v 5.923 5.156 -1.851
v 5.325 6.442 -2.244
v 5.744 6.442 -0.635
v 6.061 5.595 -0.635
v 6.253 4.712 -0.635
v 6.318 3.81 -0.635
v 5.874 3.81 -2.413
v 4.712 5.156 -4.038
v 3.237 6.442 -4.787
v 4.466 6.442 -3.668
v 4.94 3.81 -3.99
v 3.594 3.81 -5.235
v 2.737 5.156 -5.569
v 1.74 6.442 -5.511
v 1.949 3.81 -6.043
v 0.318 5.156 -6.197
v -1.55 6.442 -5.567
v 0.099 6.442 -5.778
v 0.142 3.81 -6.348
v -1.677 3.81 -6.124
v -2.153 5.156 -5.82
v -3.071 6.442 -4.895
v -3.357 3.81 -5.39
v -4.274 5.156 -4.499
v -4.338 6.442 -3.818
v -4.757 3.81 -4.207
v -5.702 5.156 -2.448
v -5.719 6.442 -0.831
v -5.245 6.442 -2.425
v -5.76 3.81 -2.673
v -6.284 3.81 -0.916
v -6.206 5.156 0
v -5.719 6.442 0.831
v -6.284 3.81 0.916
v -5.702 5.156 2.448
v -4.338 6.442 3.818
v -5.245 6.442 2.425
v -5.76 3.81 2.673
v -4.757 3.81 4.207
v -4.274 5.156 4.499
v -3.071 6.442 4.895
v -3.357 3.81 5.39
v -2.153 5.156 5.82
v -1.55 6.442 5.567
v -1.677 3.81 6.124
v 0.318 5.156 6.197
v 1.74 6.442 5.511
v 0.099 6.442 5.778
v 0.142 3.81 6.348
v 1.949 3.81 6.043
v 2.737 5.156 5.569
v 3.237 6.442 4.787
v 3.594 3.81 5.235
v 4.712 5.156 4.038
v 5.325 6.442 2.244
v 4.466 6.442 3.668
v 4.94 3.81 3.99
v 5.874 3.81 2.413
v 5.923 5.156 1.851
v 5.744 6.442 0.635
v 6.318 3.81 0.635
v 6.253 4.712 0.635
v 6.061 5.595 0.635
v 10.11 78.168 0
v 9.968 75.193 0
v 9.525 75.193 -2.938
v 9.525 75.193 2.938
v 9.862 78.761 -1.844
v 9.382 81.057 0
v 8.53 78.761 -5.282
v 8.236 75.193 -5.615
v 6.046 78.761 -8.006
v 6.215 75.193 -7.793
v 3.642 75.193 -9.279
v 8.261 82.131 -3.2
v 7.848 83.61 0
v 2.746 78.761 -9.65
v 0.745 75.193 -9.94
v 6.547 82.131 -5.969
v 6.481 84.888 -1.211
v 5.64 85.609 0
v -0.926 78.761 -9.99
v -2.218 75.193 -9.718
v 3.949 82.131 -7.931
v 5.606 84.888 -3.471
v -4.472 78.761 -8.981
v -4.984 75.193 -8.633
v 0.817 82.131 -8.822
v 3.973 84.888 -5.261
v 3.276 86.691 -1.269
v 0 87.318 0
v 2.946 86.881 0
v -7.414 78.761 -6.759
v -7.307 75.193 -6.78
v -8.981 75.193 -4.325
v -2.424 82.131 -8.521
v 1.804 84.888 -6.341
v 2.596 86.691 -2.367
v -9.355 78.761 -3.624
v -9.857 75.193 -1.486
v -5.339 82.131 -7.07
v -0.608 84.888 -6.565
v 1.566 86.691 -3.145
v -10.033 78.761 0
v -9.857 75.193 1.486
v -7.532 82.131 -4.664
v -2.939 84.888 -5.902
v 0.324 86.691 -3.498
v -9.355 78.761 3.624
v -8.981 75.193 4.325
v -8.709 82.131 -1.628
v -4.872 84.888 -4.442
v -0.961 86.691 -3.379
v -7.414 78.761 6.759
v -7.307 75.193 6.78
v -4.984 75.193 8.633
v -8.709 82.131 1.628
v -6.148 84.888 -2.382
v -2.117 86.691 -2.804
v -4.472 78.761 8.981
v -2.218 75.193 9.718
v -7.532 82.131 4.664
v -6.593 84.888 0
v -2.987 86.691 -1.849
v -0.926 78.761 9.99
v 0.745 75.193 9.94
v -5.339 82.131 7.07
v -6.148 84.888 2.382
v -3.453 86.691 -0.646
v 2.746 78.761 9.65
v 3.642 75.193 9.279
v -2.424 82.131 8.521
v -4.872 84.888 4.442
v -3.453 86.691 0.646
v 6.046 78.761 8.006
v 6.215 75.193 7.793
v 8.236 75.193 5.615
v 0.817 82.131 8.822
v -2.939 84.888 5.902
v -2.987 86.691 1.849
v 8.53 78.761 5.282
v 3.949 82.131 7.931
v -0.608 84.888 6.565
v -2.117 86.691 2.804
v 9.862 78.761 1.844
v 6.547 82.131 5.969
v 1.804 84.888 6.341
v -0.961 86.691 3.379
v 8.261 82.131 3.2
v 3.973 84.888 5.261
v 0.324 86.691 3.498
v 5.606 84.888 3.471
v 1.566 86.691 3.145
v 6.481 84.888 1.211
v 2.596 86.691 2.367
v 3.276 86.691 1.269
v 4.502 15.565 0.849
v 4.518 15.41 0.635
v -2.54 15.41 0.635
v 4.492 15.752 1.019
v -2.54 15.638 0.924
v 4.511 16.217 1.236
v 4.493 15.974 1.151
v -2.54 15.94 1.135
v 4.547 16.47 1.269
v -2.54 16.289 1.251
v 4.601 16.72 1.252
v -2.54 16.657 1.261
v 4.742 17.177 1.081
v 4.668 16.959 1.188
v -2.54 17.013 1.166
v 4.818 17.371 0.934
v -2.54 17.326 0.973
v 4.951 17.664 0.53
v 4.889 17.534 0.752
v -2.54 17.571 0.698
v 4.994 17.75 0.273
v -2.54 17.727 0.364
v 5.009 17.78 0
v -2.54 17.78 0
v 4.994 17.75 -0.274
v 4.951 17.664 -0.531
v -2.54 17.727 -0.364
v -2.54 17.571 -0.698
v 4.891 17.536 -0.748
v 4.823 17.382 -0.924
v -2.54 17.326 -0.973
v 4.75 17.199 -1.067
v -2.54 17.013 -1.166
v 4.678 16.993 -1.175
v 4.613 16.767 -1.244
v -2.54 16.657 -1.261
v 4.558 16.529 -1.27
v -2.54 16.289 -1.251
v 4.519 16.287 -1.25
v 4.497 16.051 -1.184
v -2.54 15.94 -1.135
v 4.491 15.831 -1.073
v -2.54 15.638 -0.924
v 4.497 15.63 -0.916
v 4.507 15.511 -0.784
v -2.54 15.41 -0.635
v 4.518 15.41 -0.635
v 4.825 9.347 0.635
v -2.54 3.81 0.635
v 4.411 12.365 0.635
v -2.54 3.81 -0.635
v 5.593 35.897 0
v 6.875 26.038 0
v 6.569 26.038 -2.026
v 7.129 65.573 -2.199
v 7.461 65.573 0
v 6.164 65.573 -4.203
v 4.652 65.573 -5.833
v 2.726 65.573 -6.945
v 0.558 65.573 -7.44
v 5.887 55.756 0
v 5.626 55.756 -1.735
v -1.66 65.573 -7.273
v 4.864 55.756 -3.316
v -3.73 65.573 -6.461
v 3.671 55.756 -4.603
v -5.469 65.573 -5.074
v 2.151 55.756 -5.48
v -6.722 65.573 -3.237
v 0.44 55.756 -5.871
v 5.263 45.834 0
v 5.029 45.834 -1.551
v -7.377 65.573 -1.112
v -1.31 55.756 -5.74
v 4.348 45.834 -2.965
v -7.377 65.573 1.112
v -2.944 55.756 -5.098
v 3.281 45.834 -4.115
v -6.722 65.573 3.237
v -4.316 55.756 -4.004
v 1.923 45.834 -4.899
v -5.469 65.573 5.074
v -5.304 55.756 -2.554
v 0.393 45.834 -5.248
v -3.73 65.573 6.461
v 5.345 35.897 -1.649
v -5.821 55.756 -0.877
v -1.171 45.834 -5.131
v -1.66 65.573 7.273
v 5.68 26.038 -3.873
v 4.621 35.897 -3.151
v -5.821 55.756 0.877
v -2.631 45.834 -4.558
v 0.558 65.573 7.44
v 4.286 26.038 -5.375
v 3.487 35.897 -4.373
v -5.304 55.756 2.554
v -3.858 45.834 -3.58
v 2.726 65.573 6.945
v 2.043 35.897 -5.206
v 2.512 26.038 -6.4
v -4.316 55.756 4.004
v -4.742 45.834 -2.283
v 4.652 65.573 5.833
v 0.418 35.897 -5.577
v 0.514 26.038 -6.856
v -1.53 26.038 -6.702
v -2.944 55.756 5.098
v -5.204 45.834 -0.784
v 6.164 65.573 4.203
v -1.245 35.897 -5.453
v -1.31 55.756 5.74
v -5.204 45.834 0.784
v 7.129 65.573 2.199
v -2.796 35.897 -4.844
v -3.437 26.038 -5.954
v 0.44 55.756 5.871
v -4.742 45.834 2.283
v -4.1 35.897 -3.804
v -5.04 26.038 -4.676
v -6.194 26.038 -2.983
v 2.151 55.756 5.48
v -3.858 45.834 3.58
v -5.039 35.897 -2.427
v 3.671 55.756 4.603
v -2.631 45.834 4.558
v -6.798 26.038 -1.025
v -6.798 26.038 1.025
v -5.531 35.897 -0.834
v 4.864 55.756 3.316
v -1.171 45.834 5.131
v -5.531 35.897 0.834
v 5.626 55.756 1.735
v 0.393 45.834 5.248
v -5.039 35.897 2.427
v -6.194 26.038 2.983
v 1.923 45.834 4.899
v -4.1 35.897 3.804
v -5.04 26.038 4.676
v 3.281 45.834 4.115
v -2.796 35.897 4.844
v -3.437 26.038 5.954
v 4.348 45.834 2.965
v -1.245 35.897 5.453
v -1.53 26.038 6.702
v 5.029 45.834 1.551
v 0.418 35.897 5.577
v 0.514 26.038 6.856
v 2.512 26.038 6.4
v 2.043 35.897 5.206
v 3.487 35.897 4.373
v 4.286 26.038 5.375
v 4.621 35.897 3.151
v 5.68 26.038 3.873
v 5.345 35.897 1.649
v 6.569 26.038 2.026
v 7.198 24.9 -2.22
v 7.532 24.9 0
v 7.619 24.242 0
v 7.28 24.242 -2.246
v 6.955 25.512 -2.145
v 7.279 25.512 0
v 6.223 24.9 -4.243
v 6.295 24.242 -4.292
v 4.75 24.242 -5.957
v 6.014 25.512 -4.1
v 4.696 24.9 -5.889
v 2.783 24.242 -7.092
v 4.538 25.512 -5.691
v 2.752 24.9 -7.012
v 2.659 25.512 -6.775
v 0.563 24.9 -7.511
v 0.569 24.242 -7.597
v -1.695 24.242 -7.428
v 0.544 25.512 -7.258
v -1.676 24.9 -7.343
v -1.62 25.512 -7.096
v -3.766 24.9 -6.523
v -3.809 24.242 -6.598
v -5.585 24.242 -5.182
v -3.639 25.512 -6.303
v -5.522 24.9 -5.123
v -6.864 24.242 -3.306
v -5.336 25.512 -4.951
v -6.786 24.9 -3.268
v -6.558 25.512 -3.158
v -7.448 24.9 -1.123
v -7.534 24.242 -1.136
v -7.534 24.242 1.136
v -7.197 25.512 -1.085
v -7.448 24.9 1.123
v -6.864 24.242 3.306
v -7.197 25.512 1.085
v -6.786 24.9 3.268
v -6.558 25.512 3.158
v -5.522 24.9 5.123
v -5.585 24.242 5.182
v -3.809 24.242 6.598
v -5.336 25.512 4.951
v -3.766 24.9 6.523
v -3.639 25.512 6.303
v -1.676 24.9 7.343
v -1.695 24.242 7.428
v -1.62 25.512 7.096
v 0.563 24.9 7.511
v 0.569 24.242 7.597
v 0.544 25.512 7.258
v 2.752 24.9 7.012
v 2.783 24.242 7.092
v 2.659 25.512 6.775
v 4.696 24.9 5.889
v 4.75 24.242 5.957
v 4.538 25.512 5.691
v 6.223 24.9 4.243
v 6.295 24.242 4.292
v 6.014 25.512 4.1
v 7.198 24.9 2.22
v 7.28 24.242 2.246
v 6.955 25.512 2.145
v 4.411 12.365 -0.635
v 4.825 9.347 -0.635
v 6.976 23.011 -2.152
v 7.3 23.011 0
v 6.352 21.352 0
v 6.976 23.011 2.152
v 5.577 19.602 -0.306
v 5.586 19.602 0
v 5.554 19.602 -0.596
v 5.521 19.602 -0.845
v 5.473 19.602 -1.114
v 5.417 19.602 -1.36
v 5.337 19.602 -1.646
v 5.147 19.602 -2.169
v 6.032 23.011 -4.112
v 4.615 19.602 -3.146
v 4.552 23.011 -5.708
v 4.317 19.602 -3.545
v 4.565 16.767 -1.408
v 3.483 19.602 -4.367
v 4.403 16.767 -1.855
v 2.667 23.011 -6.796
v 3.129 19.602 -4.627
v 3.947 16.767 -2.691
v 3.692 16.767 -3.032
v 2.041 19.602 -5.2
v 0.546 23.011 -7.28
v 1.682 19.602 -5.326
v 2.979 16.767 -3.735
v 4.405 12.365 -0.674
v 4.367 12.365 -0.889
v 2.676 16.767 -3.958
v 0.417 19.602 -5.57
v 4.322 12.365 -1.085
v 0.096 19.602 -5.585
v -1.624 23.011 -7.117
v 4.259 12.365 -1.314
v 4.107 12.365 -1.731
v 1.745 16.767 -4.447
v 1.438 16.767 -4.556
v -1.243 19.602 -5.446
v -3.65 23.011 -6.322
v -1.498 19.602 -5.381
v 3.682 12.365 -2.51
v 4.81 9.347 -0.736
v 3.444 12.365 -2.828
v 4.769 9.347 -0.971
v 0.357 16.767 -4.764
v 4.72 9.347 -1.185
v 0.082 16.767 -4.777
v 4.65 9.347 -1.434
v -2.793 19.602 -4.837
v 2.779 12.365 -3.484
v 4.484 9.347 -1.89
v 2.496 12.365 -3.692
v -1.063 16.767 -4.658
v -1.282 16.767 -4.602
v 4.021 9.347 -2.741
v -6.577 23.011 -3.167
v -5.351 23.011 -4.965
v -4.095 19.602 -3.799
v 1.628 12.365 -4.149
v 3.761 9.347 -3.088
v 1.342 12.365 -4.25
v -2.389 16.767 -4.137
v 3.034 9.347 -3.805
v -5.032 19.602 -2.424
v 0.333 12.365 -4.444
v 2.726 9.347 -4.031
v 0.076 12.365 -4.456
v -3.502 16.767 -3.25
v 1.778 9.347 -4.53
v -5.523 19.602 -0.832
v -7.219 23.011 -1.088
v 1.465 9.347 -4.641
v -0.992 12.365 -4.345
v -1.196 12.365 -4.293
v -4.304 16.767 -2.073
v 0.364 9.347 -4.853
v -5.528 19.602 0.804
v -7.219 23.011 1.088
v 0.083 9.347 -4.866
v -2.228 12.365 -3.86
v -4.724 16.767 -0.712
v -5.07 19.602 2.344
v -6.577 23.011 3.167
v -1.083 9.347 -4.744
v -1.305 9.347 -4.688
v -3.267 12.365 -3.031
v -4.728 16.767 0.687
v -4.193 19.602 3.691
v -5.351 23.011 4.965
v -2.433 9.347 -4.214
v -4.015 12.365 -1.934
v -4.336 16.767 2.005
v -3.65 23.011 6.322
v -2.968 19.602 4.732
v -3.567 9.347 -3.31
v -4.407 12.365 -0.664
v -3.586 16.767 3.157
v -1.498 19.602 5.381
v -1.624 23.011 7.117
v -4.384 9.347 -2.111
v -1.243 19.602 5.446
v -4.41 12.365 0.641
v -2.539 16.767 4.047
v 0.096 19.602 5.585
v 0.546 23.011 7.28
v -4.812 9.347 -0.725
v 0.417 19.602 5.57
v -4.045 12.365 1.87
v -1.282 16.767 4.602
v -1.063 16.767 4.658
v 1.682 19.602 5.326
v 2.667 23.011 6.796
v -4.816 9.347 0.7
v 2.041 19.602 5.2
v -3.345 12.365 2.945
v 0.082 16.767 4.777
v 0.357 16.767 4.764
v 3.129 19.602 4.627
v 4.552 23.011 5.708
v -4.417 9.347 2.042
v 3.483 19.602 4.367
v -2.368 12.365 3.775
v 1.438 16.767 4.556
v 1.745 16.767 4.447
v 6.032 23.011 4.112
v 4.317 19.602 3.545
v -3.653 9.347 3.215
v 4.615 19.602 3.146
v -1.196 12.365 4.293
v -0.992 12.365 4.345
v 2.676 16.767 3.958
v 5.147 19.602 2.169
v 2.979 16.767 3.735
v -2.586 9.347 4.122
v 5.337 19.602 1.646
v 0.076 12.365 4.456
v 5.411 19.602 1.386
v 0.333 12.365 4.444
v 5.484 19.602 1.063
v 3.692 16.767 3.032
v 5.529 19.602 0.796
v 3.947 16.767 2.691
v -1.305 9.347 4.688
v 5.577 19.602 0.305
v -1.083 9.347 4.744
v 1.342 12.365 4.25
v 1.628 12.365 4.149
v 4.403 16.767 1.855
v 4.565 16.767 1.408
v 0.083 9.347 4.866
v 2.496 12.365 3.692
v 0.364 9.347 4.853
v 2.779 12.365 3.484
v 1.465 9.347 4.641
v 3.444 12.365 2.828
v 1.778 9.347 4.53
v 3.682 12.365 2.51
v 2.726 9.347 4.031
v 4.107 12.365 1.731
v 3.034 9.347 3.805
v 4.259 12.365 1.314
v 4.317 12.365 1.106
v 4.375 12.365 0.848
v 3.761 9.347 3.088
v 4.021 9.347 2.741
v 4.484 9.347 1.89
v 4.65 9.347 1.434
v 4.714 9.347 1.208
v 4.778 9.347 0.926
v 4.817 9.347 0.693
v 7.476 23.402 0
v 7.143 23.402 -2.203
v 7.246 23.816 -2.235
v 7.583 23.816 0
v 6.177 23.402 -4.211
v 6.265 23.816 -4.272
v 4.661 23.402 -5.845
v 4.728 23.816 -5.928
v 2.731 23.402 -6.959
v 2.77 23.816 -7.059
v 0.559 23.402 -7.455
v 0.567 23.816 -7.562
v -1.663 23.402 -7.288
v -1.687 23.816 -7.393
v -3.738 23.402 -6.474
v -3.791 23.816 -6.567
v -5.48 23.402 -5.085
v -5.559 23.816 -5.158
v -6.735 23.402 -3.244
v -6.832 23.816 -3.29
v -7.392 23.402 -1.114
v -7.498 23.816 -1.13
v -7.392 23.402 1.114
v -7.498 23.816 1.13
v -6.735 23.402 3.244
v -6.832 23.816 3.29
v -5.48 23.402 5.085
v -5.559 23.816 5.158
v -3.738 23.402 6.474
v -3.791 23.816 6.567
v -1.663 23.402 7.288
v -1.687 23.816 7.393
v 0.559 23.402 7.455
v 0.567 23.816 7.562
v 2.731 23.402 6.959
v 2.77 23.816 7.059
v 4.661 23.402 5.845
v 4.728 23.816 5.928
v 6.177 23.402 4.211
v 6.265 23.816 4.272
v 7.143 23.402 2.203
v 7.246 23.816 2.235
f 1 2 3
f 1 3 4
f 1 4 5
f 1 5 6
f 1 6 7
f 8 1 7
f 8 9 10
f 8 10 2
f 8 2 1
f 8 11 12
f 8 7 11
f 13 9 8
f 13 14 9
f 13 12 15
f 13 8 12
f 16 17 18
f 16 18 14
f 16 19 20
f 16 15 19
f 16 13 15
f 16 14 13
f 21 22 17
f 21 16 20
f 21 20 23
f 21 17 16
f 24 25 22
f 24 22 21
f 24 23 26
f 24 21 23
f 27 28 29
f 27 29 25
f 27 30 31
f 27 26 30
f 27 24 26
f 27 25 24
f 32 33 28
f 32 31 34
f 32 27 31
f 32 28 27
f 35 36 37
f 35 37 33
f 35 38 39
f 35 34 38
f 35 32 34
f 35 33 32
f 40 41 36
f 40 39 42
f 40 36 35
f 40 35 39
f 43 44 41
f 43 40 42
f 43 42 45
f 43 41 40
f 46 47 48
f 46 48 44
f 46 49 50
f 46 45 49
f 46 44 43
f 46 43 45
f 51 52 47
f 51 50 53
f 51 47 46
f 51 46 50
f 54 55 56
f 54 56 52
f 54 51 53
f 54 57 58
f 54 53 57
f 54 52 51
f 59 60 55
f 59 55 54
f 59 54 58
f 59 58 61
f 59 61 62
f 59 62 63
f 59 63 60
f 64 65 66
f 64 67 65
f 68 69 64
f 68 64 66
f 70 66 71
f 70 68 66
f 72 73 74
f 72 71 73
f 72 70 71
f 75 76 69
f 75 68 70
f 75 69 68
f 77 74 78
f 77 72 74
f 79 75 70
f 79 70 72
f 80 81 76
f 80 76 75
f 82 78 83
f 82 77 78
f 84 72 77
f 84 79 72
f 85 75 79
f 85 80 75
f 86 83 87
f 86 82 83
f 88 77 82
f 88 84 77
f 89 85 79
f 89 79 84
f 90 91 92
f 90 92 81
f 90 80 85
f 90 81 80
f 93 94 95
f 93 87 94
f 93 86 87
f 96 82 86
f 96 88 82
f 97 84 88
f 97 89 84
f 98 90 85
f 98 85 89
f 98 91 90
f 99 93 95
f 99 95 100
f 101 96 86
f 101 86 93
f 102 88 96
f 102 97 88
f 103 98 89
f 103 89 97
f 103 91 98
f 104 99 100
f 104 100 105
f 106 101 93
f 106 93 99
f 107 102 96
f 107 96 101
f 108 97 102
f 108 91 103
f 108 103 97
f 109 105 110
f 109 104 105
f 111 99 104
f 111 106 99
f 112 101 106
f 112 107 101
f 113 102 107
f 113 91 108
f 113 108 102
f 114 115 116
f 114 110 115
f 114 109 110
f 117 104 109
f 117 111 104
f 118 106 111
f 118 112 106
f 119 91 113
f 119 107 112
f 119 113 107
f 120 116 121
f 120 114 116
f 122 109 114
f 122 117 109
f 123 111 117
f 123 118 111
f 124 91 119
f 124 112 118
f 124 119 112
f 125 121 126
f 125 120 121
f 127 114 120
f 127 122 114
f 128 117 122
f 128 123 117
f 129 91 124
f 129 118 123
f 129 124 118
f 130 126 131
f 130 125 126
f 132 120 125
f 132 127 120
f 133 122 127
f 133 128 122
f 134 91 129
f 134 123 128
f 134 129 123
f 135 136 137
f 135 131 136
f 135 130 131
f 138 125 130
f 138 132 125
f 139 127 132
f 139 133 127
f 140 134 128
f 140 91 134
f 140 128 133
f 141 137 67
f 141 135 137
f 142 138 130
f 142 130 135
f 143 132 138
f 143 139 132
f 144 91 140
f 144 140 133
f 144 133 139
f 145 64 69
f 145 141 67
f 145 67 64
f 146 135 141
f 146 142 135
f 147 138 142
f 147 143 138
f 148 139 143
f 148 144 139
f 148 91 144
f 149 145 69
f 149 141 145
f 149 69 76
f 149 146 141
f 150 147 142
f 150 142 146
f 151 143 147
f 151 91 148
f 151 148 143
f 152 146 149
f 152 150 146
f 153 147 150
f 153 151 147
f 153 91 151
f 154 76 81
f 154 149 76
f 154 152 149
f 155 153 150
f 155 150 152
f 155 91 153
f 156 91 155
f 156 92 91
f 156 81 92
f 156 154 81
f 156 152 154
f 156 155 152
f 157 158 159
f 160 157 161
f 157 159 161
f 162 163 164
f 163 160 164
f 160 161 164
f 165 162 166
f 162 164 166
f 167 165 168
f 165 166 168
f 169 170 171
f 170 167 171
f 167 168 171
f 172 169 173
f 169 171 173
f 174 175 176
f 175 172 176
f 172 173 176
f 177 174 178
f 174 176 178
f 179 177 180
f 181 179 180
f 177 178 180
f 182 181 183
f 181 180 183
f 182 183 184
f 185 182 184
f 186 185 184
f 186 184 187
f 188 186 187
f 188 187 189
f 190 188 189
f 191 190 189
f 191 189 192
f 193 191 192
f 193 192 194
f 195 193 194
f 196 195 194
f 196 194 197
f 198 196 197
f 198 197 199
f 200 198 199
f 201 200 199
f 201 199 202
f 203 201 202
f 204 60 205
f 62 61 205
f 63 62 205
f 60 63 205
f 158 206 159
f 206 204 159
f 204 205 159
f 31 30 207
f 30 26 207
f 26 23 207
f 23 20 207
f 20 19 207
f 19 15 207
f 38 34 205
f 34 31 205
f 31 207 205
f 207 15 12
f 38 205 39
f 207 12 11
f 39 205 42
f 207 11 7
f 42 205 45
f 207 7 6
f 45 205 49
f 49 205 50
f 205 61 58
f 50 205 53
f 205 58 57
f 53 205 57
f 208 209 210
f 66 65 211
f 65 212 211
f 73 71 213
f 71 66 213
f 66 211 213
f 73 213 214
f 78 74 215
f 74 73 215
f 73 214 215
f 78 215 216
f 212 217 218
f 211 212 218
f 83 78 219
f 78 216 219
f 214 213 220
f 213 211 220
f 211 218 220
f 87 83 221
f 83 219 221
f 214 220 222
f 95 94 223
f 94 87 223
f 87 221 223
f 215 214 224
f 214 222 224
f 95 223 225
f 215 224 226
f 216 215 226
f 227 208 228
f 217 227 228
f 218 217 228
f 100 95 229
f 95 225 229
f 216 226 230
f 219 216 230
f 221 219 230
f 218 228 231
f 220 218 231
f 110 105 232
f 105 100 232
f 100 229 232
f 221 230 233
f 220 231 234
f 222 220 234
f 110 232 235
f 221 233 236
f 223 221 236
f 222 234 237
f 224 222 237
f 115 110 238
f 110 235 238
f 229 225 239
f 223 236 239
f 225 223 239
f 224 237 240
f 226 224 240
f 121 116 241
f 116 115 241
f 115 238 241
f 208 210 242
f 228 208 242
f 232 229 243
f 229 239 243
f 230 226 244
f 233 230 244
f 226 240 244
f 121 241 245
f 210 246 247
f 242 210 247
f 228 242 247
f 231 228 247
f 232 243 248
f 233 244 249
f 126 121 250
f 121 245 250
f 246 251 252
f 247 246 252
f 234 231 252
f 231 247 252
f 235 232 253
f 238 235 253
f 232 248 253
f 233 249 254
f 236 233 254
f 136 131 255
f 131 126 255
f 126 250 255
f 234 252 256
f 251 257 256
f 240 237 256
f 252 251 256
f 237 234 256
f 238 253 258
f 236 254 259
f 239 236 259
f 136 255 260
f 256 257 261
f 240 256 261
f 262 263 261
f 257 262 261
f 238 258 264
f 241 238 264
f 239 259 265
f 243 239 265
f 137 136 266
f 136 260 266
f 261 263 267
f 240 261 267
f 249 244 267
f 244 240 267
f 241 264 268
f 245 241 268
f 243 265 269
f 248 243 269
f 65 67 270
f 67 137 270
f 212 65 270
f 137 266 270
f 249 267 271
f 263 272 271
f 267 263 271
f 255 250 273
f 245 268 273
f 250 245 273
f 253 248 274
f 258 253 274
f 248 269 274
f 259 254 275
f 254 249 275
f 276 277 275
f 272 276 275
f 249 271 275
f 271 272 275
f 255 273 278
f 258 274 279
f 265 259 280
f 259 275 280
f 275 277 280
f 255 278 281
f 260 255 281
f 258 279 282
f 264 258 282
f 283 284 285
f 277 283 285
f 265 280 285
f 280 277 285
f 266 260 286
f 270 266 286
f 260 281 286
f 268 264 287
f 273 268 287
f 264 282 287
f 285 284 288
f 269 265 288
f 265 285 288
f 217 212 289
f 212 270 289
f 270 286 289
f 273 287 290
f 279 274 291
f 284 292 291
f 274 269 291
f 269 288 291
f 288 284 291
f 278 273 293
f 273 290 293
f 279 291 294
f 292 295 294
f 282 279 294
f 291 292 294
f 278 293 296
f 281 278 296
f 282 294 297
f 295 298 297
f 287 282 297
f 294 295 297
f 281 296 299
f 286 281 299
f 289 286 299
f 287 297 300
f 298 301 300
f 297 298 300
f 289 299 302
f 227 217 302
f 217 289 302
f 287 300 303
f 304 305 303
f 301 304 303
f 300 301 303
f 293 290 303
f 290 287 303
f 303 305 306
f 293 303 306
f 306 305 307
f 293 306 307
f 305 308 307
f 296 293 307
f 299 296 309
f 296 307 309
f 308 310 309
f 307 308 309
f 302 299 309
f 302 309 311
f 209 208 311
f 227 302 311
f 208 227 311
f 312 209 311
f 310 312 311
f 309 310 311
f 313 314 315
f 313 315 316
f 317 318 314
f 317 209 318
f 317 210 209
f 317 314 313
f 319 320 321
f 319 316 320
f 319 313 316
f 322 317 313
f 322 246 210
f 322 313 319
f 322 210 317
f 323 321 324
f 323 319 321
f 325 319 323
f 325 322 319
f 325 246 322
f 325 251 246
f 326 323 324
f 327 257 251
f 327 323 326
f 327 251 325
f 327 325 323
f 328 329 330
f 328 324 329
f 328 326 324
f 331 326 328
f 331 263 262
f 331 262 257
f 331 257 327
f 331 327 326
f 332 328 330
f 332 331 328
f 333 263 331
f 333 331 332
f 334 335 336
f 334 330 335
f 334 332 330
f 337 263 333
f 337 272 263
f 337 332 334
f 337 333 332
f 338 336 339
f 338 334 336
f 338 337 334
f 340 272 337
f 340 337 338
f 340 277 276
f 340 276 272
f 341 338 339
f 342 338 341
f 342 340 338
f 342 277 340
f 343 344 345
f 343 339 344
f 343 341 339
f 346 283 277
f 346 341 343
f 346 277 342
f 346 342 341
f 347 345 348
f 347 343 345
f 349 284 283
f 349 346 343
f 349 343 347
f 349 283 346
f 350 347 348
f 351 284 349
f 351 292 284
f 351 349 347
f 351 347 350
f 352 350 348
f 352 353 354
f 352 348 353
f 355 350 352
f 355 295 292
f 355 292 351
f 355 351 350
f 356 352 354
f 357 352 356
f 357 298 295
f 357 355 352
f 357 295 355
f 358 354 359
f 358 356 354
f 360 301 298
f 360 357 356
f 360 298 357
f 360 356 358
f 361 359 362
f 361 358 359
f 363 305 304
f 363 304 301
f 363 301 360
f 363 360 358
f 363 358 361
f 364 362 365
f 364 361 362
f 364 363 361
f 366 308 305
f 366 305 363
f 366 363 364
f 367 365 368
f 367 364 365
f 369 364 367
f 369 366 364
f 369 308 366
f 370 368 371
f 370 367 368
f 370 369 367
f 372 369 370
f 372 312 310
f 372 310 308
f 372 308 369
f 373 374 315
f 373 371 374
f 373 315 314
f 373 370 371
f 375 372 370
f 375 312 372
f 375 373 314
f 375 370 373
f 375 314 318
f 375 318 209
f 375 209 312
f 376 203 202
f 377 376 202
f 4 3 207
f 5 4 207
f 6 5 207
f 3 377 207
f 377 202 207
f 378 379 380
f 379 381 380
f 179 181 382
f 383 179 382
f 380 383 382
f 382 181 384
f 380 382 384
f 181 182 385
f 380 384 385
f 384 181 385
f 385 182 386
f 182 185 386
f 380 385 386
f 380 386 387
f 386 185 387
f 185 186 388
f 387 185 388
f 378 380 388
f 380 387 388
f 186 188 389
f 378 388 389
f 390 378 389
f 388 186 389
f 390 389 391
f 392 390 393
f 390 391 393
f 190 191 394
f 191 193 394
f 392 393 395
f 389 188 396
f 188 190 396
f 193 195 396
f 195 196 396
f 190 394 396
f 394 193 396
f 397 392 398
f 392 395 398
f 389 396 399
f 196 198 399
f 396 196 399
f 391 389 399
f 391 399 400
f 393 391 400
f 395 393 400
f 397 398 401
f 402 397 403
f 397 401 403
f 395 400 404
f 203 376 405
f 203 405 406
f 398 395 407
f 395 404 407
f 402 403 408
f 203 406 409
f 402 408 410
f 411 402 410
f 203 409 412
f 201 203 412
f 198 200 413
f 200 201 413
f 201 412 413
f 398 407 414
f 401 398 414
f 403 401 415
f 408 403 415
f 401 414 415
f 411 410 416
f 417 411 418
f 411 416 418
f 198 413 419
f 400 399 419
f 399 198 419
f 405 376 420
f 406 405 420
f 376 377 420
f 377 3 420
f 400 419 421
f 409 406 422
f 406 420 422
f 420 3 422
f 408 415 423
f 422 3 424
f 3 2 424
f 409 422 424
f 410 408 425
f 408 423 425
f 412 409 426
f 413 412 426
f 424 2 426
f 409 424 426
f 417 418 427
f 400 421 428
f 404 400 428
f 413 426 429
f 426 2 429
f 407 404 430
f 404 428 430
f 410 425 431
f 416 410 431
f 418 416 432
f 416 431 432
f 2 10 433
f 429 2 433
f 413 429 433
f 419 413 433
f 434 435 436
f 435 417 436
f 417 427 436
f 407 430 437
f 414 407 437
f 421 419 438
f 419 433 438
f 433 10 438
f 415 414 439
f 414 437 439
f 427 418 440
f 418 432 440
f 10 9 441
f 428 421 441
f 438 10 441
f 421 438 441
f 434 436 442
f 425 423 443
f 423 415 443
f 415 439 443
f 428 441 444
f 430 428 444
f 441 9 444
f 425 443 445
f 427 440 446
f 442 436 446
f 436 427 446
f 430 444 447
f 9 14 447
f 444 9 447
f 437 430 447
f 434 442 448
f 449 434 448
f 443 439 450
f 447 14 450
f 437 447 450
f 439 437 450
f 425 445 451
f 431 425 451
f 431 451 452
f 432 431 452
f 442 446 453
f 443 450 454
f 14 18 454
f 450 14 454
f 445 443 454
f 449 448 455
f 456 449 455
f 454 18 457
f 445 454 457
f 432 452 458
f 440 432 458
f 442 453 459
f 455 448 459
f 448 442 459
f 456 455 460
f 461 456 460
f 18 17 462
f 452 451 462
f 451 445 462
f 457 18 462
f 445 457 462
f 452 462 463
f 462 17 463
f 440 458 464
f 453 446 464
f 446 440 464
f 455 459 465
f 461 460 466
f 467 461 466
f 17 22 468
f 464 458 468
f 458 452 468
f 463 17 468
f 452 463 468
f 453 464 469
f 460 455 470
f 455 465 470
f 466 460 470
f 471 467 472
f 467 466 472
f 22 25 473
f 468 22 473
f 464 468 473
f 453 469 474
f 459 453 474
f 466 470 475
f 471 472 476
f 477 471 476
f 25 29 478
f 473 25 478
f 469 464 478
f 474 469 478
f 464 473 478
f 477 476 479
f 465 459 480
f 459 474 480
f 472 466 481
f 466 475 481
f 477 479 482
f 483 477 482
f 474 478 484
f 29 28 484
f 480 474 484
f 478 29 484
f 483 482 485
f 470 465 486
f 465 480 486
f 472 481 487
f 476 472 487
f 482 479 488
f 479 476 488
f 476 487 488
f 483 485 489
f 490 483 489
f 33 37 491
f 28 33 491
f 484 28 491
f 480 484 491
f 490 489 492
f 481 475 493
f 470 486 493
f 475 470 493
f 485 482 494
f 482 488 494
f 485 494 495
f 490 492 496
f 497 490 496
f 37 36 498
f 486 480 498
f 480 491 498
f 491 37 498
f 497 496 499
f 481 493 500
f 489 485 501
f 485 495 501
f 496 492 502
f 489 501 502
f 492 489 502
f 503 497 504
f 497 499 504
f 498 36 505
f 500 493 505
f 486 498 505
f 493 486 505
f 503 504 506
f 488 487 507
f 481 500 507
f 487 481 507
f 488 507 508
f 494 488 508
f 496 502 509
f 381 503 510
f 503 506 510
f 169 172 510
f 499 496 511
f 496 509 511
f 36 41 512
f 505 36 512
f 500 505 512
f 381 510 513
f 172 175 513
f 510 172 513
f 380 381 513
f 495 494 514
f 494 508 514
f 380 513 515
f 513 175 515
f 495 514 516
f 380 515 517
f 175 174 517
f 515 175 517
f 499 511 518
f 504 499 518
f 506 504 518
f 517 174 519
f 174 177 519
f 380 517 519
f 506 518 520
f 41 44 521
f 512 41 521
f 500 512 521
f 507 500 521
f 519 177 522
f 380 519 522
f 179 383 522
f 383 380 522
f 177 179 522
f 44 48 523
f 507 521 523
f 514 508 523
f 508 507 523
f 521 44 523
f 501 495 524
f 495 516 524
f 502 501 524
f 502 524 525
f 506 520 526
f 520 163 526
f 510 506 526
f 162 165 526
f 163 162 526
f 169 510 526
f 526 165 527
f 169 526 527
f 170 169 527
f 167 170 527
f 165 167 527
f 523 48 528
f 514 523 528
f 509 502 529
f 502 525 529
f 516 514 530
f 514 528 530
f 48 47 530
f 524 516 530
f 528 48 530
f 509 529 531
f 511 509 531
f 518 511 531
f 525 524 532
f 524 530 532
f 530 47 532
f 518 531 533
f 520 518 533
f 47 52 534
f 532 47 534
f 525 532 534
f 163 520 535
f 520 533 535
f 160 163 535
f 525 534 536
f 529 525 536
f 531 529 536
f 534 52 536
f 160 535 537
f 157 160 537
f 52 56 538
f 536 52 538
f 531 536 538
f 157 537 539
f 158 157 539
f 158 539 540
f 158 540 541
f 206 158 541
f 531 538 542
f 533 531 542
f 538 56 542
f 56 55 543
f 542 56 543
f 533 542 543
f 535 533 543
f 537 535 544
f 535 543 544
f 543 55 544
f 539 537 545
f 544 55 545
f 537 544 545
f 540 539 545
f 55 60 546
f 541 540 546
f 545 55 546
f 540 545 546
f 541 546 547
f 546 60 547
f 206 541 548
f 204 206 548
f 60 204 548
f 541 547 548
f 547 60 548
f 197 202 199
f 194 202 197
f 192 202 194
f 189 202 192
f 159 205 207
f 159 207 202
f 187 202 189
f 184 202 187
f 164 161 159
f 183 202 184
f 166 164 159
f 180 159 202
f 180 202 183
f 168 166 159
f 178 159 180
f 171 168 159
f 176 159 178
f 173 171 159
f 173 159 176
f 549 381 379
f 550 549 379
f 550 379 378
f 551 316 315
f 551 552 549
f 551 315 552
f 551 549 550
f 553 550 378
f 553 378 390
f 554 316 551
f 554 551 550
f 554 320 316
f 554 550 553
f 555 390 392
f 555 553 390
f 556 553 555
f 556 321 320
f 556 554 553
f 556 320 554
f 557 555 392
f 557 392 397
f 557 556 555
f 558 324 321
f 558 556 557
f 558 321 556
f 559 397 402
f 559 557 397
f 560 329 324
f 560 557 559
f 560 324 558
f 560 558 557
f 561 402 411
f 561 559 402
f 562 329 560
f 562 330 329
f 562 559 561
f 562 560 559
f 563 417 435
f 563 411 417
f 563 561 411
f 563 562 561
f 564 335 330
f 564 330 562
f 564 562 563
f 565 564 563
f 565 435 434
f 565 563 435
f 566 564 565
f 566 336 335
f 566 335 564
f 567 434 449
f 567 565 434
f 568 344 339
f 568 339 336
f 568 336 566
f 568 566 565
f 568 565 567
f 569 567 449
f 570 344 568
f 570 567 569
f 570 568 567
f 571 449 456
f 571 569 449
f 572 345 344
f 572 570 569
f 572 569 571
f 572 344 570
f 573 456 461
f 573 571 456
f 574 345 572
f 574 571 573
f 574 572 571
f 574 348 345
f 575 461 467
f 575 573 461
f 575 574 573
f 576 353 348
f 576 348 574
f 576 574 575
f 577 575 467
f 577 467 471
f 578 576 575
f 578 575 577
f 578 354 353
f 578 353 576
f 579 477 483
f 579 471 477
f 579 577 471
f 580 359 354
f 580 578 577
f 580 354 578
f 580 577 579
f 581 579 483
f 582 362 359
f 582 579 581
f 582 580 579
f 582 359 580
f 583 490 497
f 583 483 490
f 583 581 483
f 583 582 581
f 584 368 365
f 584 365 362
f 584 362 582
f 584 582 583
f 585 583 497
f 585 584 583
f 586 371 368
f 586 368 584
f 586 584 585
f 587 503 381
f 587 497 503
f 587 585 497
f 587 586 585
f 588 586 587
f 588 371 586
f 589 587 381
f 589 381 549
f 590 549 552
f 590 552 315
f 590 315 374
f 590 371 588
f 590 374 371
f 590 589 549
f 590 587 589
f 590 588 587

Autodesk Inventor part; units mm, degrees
ref_plane "YZ Plane" through (0, 0, 0) normal (1, 0, 0) x (0, 1, 0)
ref_plane "XZ Plane" through (0, 0, 0) normal (0, 1, 0) x (-1, 0, 0)
ref_plane "XY Plane" through (0, 0, 0) normal (0, 0, 1) x (1, 0, 0)
sketch "Sketch1" plane through (0, 0, 0) normal (0, 1, 0) x (-1, 0, 0)
  circle A0 centre (0, 0) radius 12.7
  line L0 (12.7, 12.7) -> (12.7, -12.7) construction
  line L1 (12.7, -12.7) -> (-12.7, -12.7) construction
  line L2 (-12.7, -12.7) -> (-12.7, 12.7) construction
  line L3 (-12.7, 12.7) -> (12.7, 12.7) construction
  circle A1 centre (0, 0) radius 12.1875
  circle A2 centre (0, 0) radius 11.5722
  line L4 (12.7, 0) -> (-28.224, 0)
  spline S0 degree 4 poles (7.5608, 0) (7.5871, -0.2498) (7.5716, -0.8639) (7.6635, -1.72) (7.771, -2.5827) (7.8796, -3.1444) (8.0283, -3.9996) (8.2528, -4.7367) (8.3389, -5.0369) (8.4927, -5.4299) (8.607, -5.7477) (8.7077, -5.9466) (8.7297, -6.0528) (8.7259, -6.1323) (8.6915, -6.2267) (8.6084, -6.3073) (8.4656, -6.4322) (8.3108, -6.5585) (7.9581, -6.8561) (7.7627, -7.0404) (7.5994, -7.1572) (7.2874, -7.4352) (7.0492, -7.6385) (6.8557, -7.7767) (6.6363, -7.9955) (6.5444, -8.04) (6.425, -8.09) (6.3049, -8.0852) (6.1612, -8.0439) (5.8673, -7.9243) (5.2047, -7.7184) (4.9544, -7.6282) (4.5834, -7.5418) (3.9869, -7.3825) (3.5585, -7.2836) (3.3261, -7.2353) (2.6639, -7.1283) (2.4923, -7.0851) (1.885, -7.0109) (1.2249, -6.9515) (0.9978, -6.9092) (-0.0967, -6.8274) (-0.0908, -6.8879) (-0.9888, -6.8956) (-1.4498, -6.994) (-2.157, -7.03) (-2.8755, -7.1861) (-3.3866, -7.2397) (-4.3934, -7.4794) (-4.8139, -7.612) (-5.3152, -7.7313) (-5.615, -7.8484) (-5.8655, -7.9444) (-6.1746, -8.0443) (-6.2691, -8.0783) (-6.3955, -8.0918) (-6.486, -8.0779) (-6.6705, -8.0058) (-6.661, -7.9168) (-6.8879, -7.7874) (-7.0089, -7.6489) (-7.1824, -7.5178) (-7.3229, -7.3873) (-7.5822, -7.175) (-7.7931, -7.0025) (-8.0826, -6.7466) (-8.2527, -6.613) (-8.4352, -6.4317) (-8.5724, -6.3549) (-8.667, -6.2237) (-8.6858, -6.2037) (-8.7162, -6.092) (-8.7131, -6.0317) (-8.695, -5.9554) (-8.5854, -5.7043) (-8.4697, -5.4626) (-8.3913, -5.2076) (-8.2879, -4.9538) (-8.1958, -4.6121) (-8.0468, -4.045) (-7.9725, -3.8304) (-7.7592, -2.661) (-7.6907, -2.1909) (-7.6151, -1.4373) (-7.564, -0.619) (-7.5516, -0.3428) (-7.5554, -0.0046) (-7.5638, 0) knots 0 0 0 0 0 0.039296 0.055908 0.073069 0.090127 0.10618 0.121509 0.134965 0.146316 0.15619 0.164179 0.170591 0.176443 0.182863 0.190407 0.199969 0.210544 0.221389 0.232964 0.244031 0.25516 0.266564 0.276442 0.284967 0.292352 0.298886 0.30652 0.31685 0.32851 0.341463 0.355682 0.368855 0.381917 0.395666 0.408085 0.420945 0.435034 0.448763 0.464427 0.47884 0.493305 0.508372 0.522986 0.539358 0.555691 0.57306 0.589942 0.605994 0.620829 0.633477 0.645128 0.655027 0.663676 0.671144 0.677933 0.684628 0.692084 0.700281 0.708721 0.71788 0.727519 0.737693 0.74871 0.760009 0.770972 0.781161 0.789961 0.797299 0.803676 0.809144 0.814179 0.820577 0.828361 0.837524 0.847989 0.859019 0.870721 0.882901 0.897625 0.913523 0.930287 0.948149 0.964022 0.978288 1 1 1 1 1
  spline S1 degree 4 poles (7.5608, 0) (7.5871, 0.2498) (7.5716, 0.8639) (7.6635, 1.72) (7.771, 2.5827) (7.8796, 3.1444) (8.0283, 3.9996) (8.2528, 4.7367) (8.3389, 5.0368) (8.4927, 5.4299) (8.607, 5.7477) (8.7077, 5.9466) (8.7297, 6.0528) (8.7259, 6.1323) (8.6915, 6.2267) (8.6084, 6.3073) (8.4656, 6.4322) (8.3108, 6.5585) (7.9581, 6.8561) (7.7627, 7.0404) (7.5994, 7.1572) (7.2874, 7.4352) (7.0492, 7.6385) (6.8557, 7.7767) (6.6363, 7.9955) (6.5444, 8.04) (6.425, 8.09) (6.3049, 8.0852) (6.1612, 8.0439) (5.8673, 7.9243) (5.2047, 7.7184) (4.9544, 7.6282) (4.5834, 7.5418) (3.9869, 7.3825) (3.5585, 7.2836) (3.3261, 7.2353) (2.6639, 7.1283) (2.4923, 7.0851) (1.885, 7.0109) (1.2249, 6.9515) (0.9978, 6.9092) (-0.0967, 6.8274) (-0.0908, 6.8879) (-0.9888, 6.8956) (-1.4498, 6.994) (-2.157, 7.03) (-2.8755, 7.1861) (-3.3866, 7.2397) (-4.3934, 7.4794) (-4.8139, 7.612) (-5.3152, 7.7313) (-5.615, 7.8484) (-5.8655, 7.9444) (-6.1746, 8.0443) (-6.2691, 8.0783) (-6.3955, 8.0918) (-6.486, 8.0779) (-6.6705, 8.0058) (-6.661, 7.9168) (-6.8879, 7.7874) (-7.0089, 7.6489) (-7.1824, 7.5178) (-7.3229, 7.3873) (-7.5822, 7.175) (-7.7931, 7.0025) (-8.0826, 6.7466) (-8.2527, 6.613) (-8.4352, 6.4317) (-8.5724, 6.3549) (-8.667, 6.2237) (-8.6858, 6.2037) (-8.7162, 6.092) (-8.7131, 6.0317) (-8.695, 5.9554) (-8.5854, 5.7043) (-8.4697, 5.4626) (-8.3913, 5.2076) (-8.2879, 4.9538) (-8.1958, 4.6121) (-8.0468, 4.045) (-7.9725, 3.8304) (-7.7592, 2.661) (-7.6907, 2.1909) (-7.6151, 1.4373) (-7.564, 0.619) (-7.5516, 0.3428) (-7.5554, 0.0046) (-7.5638, 0) knots 0 0 0 0 0 0.039296 0.055908 0.073069 0.090127 0.10618 0.121509 0.134965 0.146316 0.15619 0.164179 0.170591 0.176443 0.182863 0.190407 0.199969 0.210544 0.221389 0.232964 0.244031 0.25516 0.266564 0.276442 0.284967 0.292352 0.298886 0.30652 0.31685 0.32851 0.341463 0.355682 0.368855 0.381917 0.395666 0.408085 0.420945 0.435034 0.448763 0.464427 0.47884 0.493305 0.508372 0.522986 0.539358 0.555691 0.57306 0.589942 0.605994 0.620829 0.633477 0.645128 0.655027 0.663676 0.671144 0.677933 0.684628 0.692084 0.700281 0.708721 0.71788 0.727519 0.737693 0.74871 0.760009 0.770972 0.781161 0.789961 0.797299 0.803676 0.809144 0.814179 0.820577 0.828361 0.837524 0.847989 0.859019 0.870721 0.882901 0.897625 0.913523 0.930287 0.948149 0.964022 0.978288 1 1 1 1 1
  spline S2 degree 4 poles (6.6698, 0) (6.6871, -0.3978) (6.6713, -0.7815) (6.7409, -1.5229) (6.8536, -2.5936) (6.9252, -2.906) (7.0997, -3.8444) (7.2267, -4.3825) (7.3633, -4.7956) (7.4896, -5.3512) (7.6112, -5.5391) (7.6677, -5.7689) (7.6975, -5.7897) (7.7062, -5.8965) (7.6285, -5.9815) (7.572, -6.0514) (7.3996, -6.178) (7.1331, -6.4178) (6.9588, -6.5681) (6.6364, -6.8323) (6.5004, -6.9541) (6.3704, -7.0647) (6.3037, -7.1086) (6.2234, -7.1388) (6.1631, -7.1283) (6.0268, -7.0924) (5.9076, -7.0514) (5.5806, -6.952) (5.3855, -6.8908) (5.038, -6.812) (4.9484, -6.7624) (4.2814, -6.6028) (4.0156, -6.5429) (3.8882, -6.5183) (3.3037, -6.3965) (2.8824, -6.3286) (2.5502, -6.2731) (2.4025, -6.2241) (1.6246, -6.1518) (1.37, -6.0874) (1.1134, -6.1) (0.6072, -6.0267) (0.5913, -6.054) (0.1833, -6.0225) (0.0815, -6.0123) (-0.2846, -6.0335) (-0.5883, -6.0362) (-0.9225, -6.0806) (-1.3996, -6.1121) (-1.6329, -6.1378) (-2.1126, -6.197) (-2.4639, -6.2503) (-2.782, -6.3007) (-3.1586, -6.3702) (-3.2077, -6.3787) (-3.7538, -6.4818) (-4.0918, -6.5436) (-4.3482, -6.6242) (-4.8814, -6.7303) (-5.2054, -6.8556) (-5.5087, -6.9063) (-5.6572, -6.9822) (-5.9526, -7.0706) (-6.1139, -7.1317) (-6.1762, -7.1269) (-6.2789, -7.1205) (-6.425, -7.0257) (-6.5484, -6.9167) (-6.706, -6.7703) (-6.9687, -6.5457) (-7.0919, -6.4669) (-7.3885, -6.1958) (-7.4865, -6.1263) (-7.6283, -5.9822) (-7.6822, -5.9316) (-7.7081, -5.8596) (-7.7006, -5.7637) (-7.6112, -5.6344) (-7.5282, -5.3549) (-7.4652, -5.1836) (-7.3295, -4.7829) (-7.1819, -4.1547) (-7.1117, -3.848) (-6.9524, -3.2013) (-6.8781, -2.6524) (-6.8463, -2.4403) (-6.7659, -1.8396) (-6.735, -1.4493) (-6.7089, -1.1731) (-6.6784, -0.6337) (-6.6716, -0.3941) (-6.6731, -0.0474) (-6.6763, 0) knots 0 0 0 0 0 0.039448 0.055349 0.072269 0.088737 0.104506 0.120552 0.134467 0.146293 0.155548 0.162505 0.168442 0.174025 0.180717 0.189099 0.198791 0.210185 0.221737 0.232089 0.240921 0.247815 0.253612 0.259204 0.265359 0.273108 0.282299 0.292472 0.302955 0.314654 0.326295 0.337305 0.349803 0.361846 0.37389 0.386284 0.399242 0.411449 0.423896 0.437159 0.44785 0.458402 0.468238 0.477683 0.488335 0.499312 0.51153 0.523717 0.536339 0.54908 0.561517 0.573881 0.584661 0.595665 0.606838 0.61814 0.631344 0.644301 0.656608 0.668396 0.679342 0.688982 0.697238 0.704622 0.711137 0.717919 0.725945 0.735426 0.745345 0.756153 0.766663 0.776344 0.78489 0.791619 0.7976 0.803458 0.810655 0.819014 0.829148 0.841433 0.854403 0.869138 0.884301 0.898105 0.912368 0.925751 0.938316 0.951323 0.9634 0.975086 1 1 1 1 1
  spline S3 degree 4 poles (6.6698, 0) (6.6871, 0.3978) (6.6713, 0.7814) (6.7409, 1.5229) (6.8536, 2.5936) (6.9252, 2.906) (7.0997, 3.8444) (7.2267, 4.3825) (7.3633, 4.7956) (7.4896, 5.3512) (7.6112, 5.5391) (7.6677, 5.7689) (7.6975, 5.7897) (7.7062, 5.8965) (7.6285, 5.9815) (7.572, 6.0514) (7.3996, 6.178) (7.1331, 6.4178) (6.9588, 6.5681) (6.6364, 6.8323) (6.5004, 6.9541) (6.3704, 7.0646) (6.3037, 7.1085) (6.2234, 7.1388) (6.1631, 7.1283) (6.0268, 7.0924) (5.9076, 7.0514) (5.5806, 6.952) (5.3855, 6.8908) (5.038, 6.812) (4.9484, 6.7624) (4.2814, 6.6028) (4.0156, 6.5429) (3.8882, 6.5183) (3.3037, 6.3965) (2.8824, 6.3286) (2.5502, 6.2731) (2.4025, 6.2241) (1.6246, 6.1517) (1.37, 6.0874) (1.1134, 6.1) (0.6072, 6.0267) (0.5913, 6.054) (0.1833, 6.0225) (0.0815, 6.0123) (-0.2846, 6.0335) (-0.5883, 6.0362) (-0.9225, 6.0806) (-1.3996, 6.1121) (-1.6329, 6.1378) (-2.1126, 6.197) (-2.4639, 6.2503) (-2.782, 6.3007) (-3.1586, 6.3702) (-3.2077, 6.3787) (-3.7538, 6.4818) (-4.0918, 6.5436) (-4.3482, 6.6242) (-4.8814, 6.7303) (-5.2054, 6.8556) (-5.5087, 6.9063) (-5.6572, 6.9822) (-5.9526, 7.0706) (-6.1139, 7.1317) (-6.1762, 7.1269) (-6.2789, 7.1205) (-6.425, 7.0257) (-6.5484, 6.9166) (-6.706, 6.7703) (-6.9687, 6.5457) (-7.0919, 6.4669) (-7.3885, 6.1958) (-7.4865, 6.1263) (-7.6283, 5.9822) (-7.6822, 5.9316) (-7.7081, 5.8596) (-7.7006, 5.7637) (-7.6112, 5.6344) (-7.5282, 5.3549) (-7.4652, 5.1836) (-7.3295, 4.7829) (-7.1819, 4.1547) (-7.1117, 3.848) (-6.9524, 3.2013) (-6.8781, 2.6524) (-6.8463, 2.4403) (-6.7659, 1.8396) (-6.735, 1.4493) (-6.7089, 1.1731) (-6.6784, 0.6337) (-6.6716, 0.3941) (-6.6731, 0.0474) (-6.6763, 0) knots 0 0 0 0 0 0.039448 0.055349 0.072269 0.088737 0.104506 0.120552 0.134467 0.146293 0.155548 0.162505 0.168442 0.174025 0.180717 0.189099 0.198791 0.210185 0.221737 0.232089 0.240921 0.247815 0.253612 0.259204 0.265359 0.273108 0.282299 0.292472 0.302955 0.314654 0.326295 0.337305 0.349803 0.361846 0.37389 0.386284 0.399242 0.411449 0.423896 0.437159 0.44785 0.458402 0.468238 0.477683 0.488335 0.499312 0.51153 0.523717 0.536339 0.54908 0.561517 0.573881 0.584661 0.595665 0.606838 0.61814 0.631344 0.644301 0.656608 0.668396 0.679342 0.688982 0.697238 0.704622 0.711137 0.717919 0.725945 0.735426 0.745345 0.756153 0.766663 0.776344 0.78489 0.791619 0.7976 0.803458 0.810655 0.819014 0.829148 0.841433 0.854403 0.869138 0.884301 0.898105 0.912368 0.925751 0.938316 0.951323 0.9634 0.975086 1 1 1 1 1
  line L5 (1.0941, 0) -> (1.0941, -2.0952)
  line L6 (1.0941, -2.0952) -> (3.9049, -2.2474)
  line L7 (3.9049, -2.2474) -> (4.7904, -1.5612)
  line L8 (-0.5884, 0) -> (-0.5898, -1.9938)
  line L9 (-0.5898, -1.9938) -> (-4.3298, -1.7894)
  line L10 (-4.3298, -1.7894) -> (-5.2324, -1.0809)
  line L11 (5.0927, -1.7005) -> (5.1051, -4.9152)
  line L12 (4.7853, -5.0014) -> (3.8243, -3.9243)
  line L13 (3.8243, -3.9243) -> (-4.2884, -3.485)
  line L14 (-4.2884, -3.485) -> (-5.2324, -4.5455)
  line L15 (-5.5377, -4.4469) -> (-5.5322, -1.2345)
  arc A3 (5.0927, -1.7005) -> (4.7904, -1.5612) centre (4.931, -1.6537) ccw
  arc A4 (4.7853, -5.0014) -> (5.1051, -4.9152) centre (4.9338, -4.9158) ccw
  arc A5 (-5.5377, -4.4469) -> (-5.2324, -4.5455) centre (-5.3693, -4.4472) ccw
  arc A6 (-5.2324, -1.0809) -> (-5.5322, -1.2345) centre (-5.368, -1.1857) ccw
  line L16 (1.0941, 0) -> (1.0941, 2.0952)
  line L17 (1.0941, 2.0952) -> (3.9049, 2.2474)
  line L18 (3.9049, 2.2474) -> (4.7904, 1.5612)
  line L19 (-0.5884, 0) -> (-0.5898, 1.9938)
  line L20 (-0.5898, 1.9938) -> (-4.3298, 1.7894)
  line L21 (-4.3298, 1.7894) -> (-5.2324, 1.0809)
  line L22 (5.0927, 1.7005) -> (5.1051, 4.9152)
  line L23 (4.7853, 5.0014) -> (3.8243, 3.9243)
  line L24 (3.8243, 3.9243) -> (-4.2884, 3.485)
  line L25 (-4.2884, 3.485) -> (-5.2324, 4.5455)
  arc A7 (4.7904, 1.5612) -> (5.0927, 1.7005) centre (4.931, 1.6537) ccw
  arc A8 (5.1051, 4.9152) -> (4.7853, 5.0014) centre (4.9338, 4.9158) ccw
  arc A9 (-5.2324, 4.5455) -> (-5.5377, 4.4469) centre (-5.3693, 4.4472) ccw
  arc A10 (-5.5322, 1.2345) -> (-5.2324, 1.0809) centre (-5.368, 1.1857) ccw
  line L26 (-5.5377, 4.4469) -> (-5.5322, 1.2345)
  point P0 (7.582, -0.4475)
  point P1 (7.6181, -1.1897)
  point P2 (7.6938, -1.9478)
  point P3 (7.7753, -2.5562)
  point P4 (7.8781, -3.1491)
  point P5 (8.0672, -4.0731)
  point P6 (8.2624, -4.7725)
  point P7 (8.3673, -5.0974)
  point P8 (8.5065, -5.4722)
  point P9 (8.6396, -5.8063)
  point P10 (8.7107, -5.9813)
  point P11 (8.7259, -6.0648)
  point P12 (8.7208, -6.1314)
  point P13 (8.6916, -6.2086)
  point P14 (8.625, -6.2893)
  point P15 (8.5035, -6.398)
  point P16 (8.3259, -6.5472)
  point P17 (7.9666, -6.8536)
  point P18 (7.7597, -7.0347)
  point P19 (7.5972, -7.1666)
  point P20 (7.2997, -7.4223)
  point P21 (7.0358, -7.6431)
  point P22 (6.8133, -7.8257)
  point P23 (6.615, -7.9971)
  point P24 (6.5232, -8.0478)
  point P25 (6.4269, -8.0794)
  point P26 (6.3307, -8.0824)
  point P27 (6.2157, -8.0568)
  point P28 (5.939, -7.9581)
  point P29 (5.2485, -7.7291)
  point P30 (4.9341, -7.6303)
  point P31 (4.5863, -7.5395)
  point P32 (3.9767, -7.3836)
  point P33 (3.5714, -7.2881)
  point P34 (3.2721, -7.2292)
  point P35 (2.7391, -7.1371)
  point P36 (2.4628, -7.0879)
  point P37 (1.9303, -7.0199)
  point P38 (1.3001, -6.9537)
  point P39 (0.8618, -6.905)
  point P40 (0.0288, -6.8555)
  point P41 (-0.2052, -6.8728)
  point P42 (-0.8545, -6.91)
  point P43 (-1.4645, -6.978)
  point P44 (-2.1388, -7.0515)
  point P45 (-2.824, -7.1641)
  point P46 (-3.4525, -7.2709)
  point P47 (-4.4053, -7.4924)
  point P48 (-4.9149, -7.6324)
  point P49 (-5.3455, -7.7526)
  point P50 (-5.6379, -7.8568)
  point P51 (-5.9277, -7.9626)
  point P52 (-6.1933, -8.0512)
  point P53 (-6.2931, -8.0776)
  point P54 (-6.3884, -8.0863)
  point P55 (-6.4903, -8.0706)
  point P56 (-6.6308, -8.0034)
  point P57 (-6.6877, -7.9317)
  point P58 (-6.8516, -7.7973)
  point P59 (-7.0164, -7.6529)
  point P60 (-7.1659, -7.5263)
  point P61 (-7.3162, -7.3971)
  point P62 (-7.5527, -7.1992)
  point P63 (-7.8063, -6.9879)
  point P64 (-8.0883, -6.7461)
  point P65 (-8.2789, -6.5822)
  point P66 (-8.4597, -6.4263)
  point P67 (-8.5958, -6.3127)
  point P68 (-8.6662, -6.2262)
  point P69 (-8.6877, -6.1869)
  point P70 (-8.71, -6.101)
  point P71 (-8.7118, -6.043)
  point P72 (-8.6987, -5.9829)
  point P73 (-8.6117, -5.7675)
  point P74 (-8.4802, -5.4672)
  point P75 (-8.3902, -5.2184)
  point P76 (-8.3037, -4.977)
  point P77 (-8.2036, -4.6385)
  point P78 (-8.0738, -4.1578)
  point P79 (-7.9798, -3.7988)
  point P80 (-7.7876, -2.7953)
  point P81 (-7.688, -2.1188)
  point P82 (-7.614, -1.3524)
  point P83 (-7.5689, -0.6701)
  point P84 (-7.5559, -0.2905)
  point P85 (-7.5591, -0.0322)
  point P86 (7.582, 0.4475)
  point P87 (7.6181, 1.1897)
  point P88 (7.6938, 1.9478)
  point P89 (7.7753, 2.5562)
  point P90 (7.8781, 3.1491)
  point P91 (8.0672, 4.0731)
  point P92 (8.2624, 4.7725)
  point P93 (8.3673, 5.0973)
  point P94 (8.5065, 5.4722)
  point P95 (8.6396, 5.8063)
  point P96 (8.7107, 5.9813)
  point P97 (8.7259, 6.0648)
  point P98 (8.7208, 6.1314)
  point P99 (8.6916, 6.2085)
  point P100 (8.625, 6.2893)
  point P101 (8.5035, 6.398)
  point P102 (8.3259, 6.5472)
  point P103 (7.9666, 6.8536)
  point P104 (7.7597, 7.0347)
  point P105 (7.5972, 7.1666)
  point P106 (7.2997, 7.4223)
  point P107 (7.0358, 7.6431)
  point P108 (6.8133, 7.8257)
  point P109 (6.615, 7.997)
  point P110 (6.5232, 8.0478)
  point P111 (6.4269, 8.0794)
  point P112 (6.3307, 8.0824)
  point P113 (6.2157, 8.0568)
  point P114 (5.939, 7.9581)
  point P115 (5.2485, 7.7291)
  point P116 (4.9341, 7.6303)
  point P117 (4.5863, 7.5395)
  point P118 (3.9767, 7.3836)
  point P119 (3.5714, 7.2881)
  point P120 (3.2721, 7.2292)
  point P121 (2.7391, 7.1371)
  point P122 (2.4628, 7.0879)
  point P123 (1.9303, 7.0199)
  point P124 (1.3001, 6.9537)
  point P125 (0.8618, 6.905)
  point P126 (0.0288, 6.8555)
  point P127 (-0.2052, 6.8727)
  point P128 (-0.8545, 6.91)
  point P129 (-1.4645, 6.978)
  point P130 (-2.1388, 7.0515)
  point P131 (-2.824, 7.1641)
  point P132 (-3.4525, 7.2709)
  point P133 (-4.4053, 7.4924)
  point P134 (-4.9149, 7.6324)
  point P135 (-5.3455, 7.7526)
  point P136 (-5.6379, 7.8568)
  point P137 (-5.9277, 7.9626)
  point P138 (-6.1933, 8.0512)
  point P139 (-6.2931, 8.0776)
  point P140 (-6.3884, 8.0863)
  point P141 (-6.4903, 8.0706)
  point P142 (-6.6308, 8.0034)
  point P143 (-6.6877, 7.9317)
  point P144 (-6.8516, 7.7973)
  point P145 (-7.0164, 7.6529)
  point P146 (-7.1659, 7.5263)
  point P147 (-7.3162, 7.3971)
  point P148 (-7.5527, 7.1992)
  point P149 (-7.8063, 6.9879)
  point P150 (-8.0883, 6.746)
  point P151 (-8.2789, 6.5822)
  point P152 (-8.4597, 6.4263)
  point P153 (-8.5958, 6.3127)
  point P154 (-8.6662, 6.2262)
  point P155 (-8.6877, 6.1869)
  point P156 (-8.71, 6.101)
  point P157 (-8.7118, 6.043)
  point P158 (-8.6987, 5.9829)
  point P159 (-8.6117, 5.7675)
  point P160 (-8.4802, 5.4672)
  point P161 (-8.3902, 5.2183)
  point P162 (-8.3037, 4.977)
  point P163 (-8.2036, 4.6385)
  point P164 (-8.0738, 4.1578)
  point P165 (-7.9798, 3.7987)
  point P166 (-7.7876, 2.7953)
  point P167 (-7.688, 2.1188)
  point P168 (-7.614, 1.3524)
  point P169 (-7.5689, 0.6701)
  point P170 (-7.5559, 0.2905)
  point P171 (-7.5591, 0.0322)
  point P172 (6.6836, -0.5412)
  point P173 (6.7072, -1.0761)
  point P174 (6.774, -1.8261)
  point P175 (6.8568, -2.5341)
  point P176 (6.9346, -2.9728)
  point P177 (7.1026, -3.8229)
  point P178 (7.2446, -4.4136)
  point P179 (7.3804, -4.8955)
  point P180 (7.5322, -5.3935)
  point P181 (7.6322, -5.6381)
  point P182 (7.6779, -5.7675)
  point P183 (7.6936, -5.8064)
  point P184 (7.6937, -5.8803)
  point P185 (7.6435, -5.9655)
  point P186 (7.5821, -6.0322)
  point P187 (7.446, -6.1471)
  point P188 (7.1705, -6.3831)
  point P189 (6.9233, -6.5957)
  point P190 (6.6151, -6.8536)
  point P191 (6.4599, -6.9878)
  point P192 (6.3548, -7.0726)
  point P193 (6.2905, -7.111)
  point P194 (6.2287, -7.1307)
  point P195 (6.1718, -7.1283)
  point P196 (6.068, -7.1023)
  point P197 (5.9271, -7.0591)
  point P198 (5.6207, -6.9639)
  point P199 (5.36, -6.8886)
  dimension "d0" = 25.4
  dimension "d32" = 25.4
  dimension "d39" = 25.4
extrude "Extrusion1" add sketch "Sketch1" along normal blind 1.905 contours L4 A2 A1 | A1 L4 A2 | S0 L4 S2 | L4 S3 S1 | L5 L6 L7 A3 L11 A4 L12 L13 L14 A5 L15 A6 L10 L9 L8 L4 | L4 L19 L20 L21 A10 L26 A9 L25 L24 L23 A8 L22 A7 L18 L17 L16
sketch "Sketch2" plane through (0, 1.905, 0) normal (0, 1, 0) x (1, 0, 0)
  line L0 (12.7067, 12.7) -> (12.7067, -12.7) construction
  line L1 (12.7067, -12.7) -> (-12.6933, -12.7) construction
  line L2 (-12.6933, -12.7) -> (-12.6933, 12.7) construction
  line L3 (-12.6933, 12.7) -> (12.7067, 12.7) construction
  circle A0 centre (0, 0) radius 12.1875 projected
  line L4 (-12.1875, 0) -> (-18.0724, 0)
  circle A1 centre (0, 0) radius 12.7
  dimension "d92" = 25.4
  dimension "d98" = 25.4
extrude "Extrusion2" add sketch "Sketch2" along normal blind 1.905 contours A0 | A1
sketch "Sketch3" plane through (0, 0, 0) normal (0, 0, 1) x (1, 0, 0)
  line L0 (0, 0) -> (0, 88.9)
  line L1 (134.3126, 257.1223) -> (473.4262, 257.1223) construction
  line L2 (473.4262, 257.1223) -> (473.4262, 17.1036) construction
  line L3 (473.4262, 17.1036) -> (134.3126, 17.1036) construction
  line L4 (134.3126, 17.1036) -> (134.3126, 257.1223) construction
  circle A0 centre (112.6944, 39.6279) radius 12.7
  circle A1 centre (0, 44.45) radius 5.08
  circle A2 centre (0, 77.1578) radius 10.16
  line L5 (0, 44.45) -> (0, 3.81)
  line L6 (12.7, 3.81) -> (-12.7, 3.81) projected
  circle A3 centre (0, 24.13) radius 5.08
  circle A4 centre (5.0788, 24.2425) radius 2.54
  circle A5 centre (-4.9792, 23.1233) radius 2.54
  line L7 (-4.9792, 23.1233) -> (-13.9595, 32.1035)
  line L8 (-4.9792, 23.1233) -> (7.7208, 23.1233) construction
  line L9 (5.0788, 24.2425) -> (14.059, 33.2227)
  line L10 (5.0788, 24.2425) -> (17.7788, 24.2425) construction
  line L11 (5.0788, 24.2425) -> (12.9329, 19.8885)
  line L12 (-4.9792, 23.1233) -> (-13.9595, 14.143)
  line L13 (-4.9792, 23.1233) -> (7.7208, 23.1233) construction
  arc A6 (9.9682, 75.1929) -> (6.8748, 26.0385) centre (108.777, 44.3001) ccw
  arc A7 (-6.7753, 24.9193) -> (-9.9499, 75.1021) centre (-109.0911, 43.6386) ccw
  circle A8 centre (0, 3.81) radius 6.35
  line L14 (0, 24.13) -> (0, 3.81)
  circle A9 centre (0, 13.97) radius 4.445
  arc A10 (-6.35, 3.81) -> (-6.7753, 21.3272) centre (-23.0464, 12.1684) ccw
  arc A11 (7.3002, 23.011) -> (5.779, 6.4416) centre (22.4276, 13.2676) ccw
  point P0 (0, 87.3178)
  point P1 (0, 3.81)
  point P2 (6.35, 3.81)
  dimension "d101" = 88.9
  dimension "d103" = 25.4
  dimension "d118" = 10.16
  dimension "d122" = 20.32
  dimension "d123" = 10.16
  dimension "d124" = 5.08
  dimension "d125" = 5.08
  dimension "d126" = 12.7
  dimension "d127" = 135
  dimension "d128" = 12.7
  dimension "d129" = 45
  dimension "d130" = 12.7
  dimension "d131" = 135
  dimension "d132" = 12.7
  dimension "d133" = 8.89
revolve "Revolution1" add sketch "Sketch3" angle 360 about axis through (0, 44.45, 0) along (0, -1, 0) picked at (0.2042, 9.7508) picked at (0.3297, 15.6262) picked at (3.3442, 44.0732) contours L0 A9 A8 L6 | L0 A8 A9 | L0 A9 A8 | A9 A11 A8 | L0 A3 A4 A11 A9 | L0 A3 A4 | A4 A3 L11 A11 | A4 A3 | L11 L9 A4 | L0 A1 A2 A6 A4 A3 | A4 L9 A3 | L0 A1 | A2 L0 A6
sketch "Sketch4" plane through (0, 0, 0) normal (1, 0, 0) x (0, 1, 0)
  line L0 (3.81, 6.35) -> (3.81, -6.35) projected
  line L1 (3.81, 0) -> (16.51, 0)
  line L2 (16.51, 0) -> (16.51, -0.635)
  line L3 (16.51, -0.635) -> (3.81, -0.635)
  line L4 (3.81, -0.635) -> (3.81, 0)
  line L5 (16.51, -0.635) -> (3.81, -0.635)
  line L6 (3.81, -0.635) -> (3.81, 0.635)
  line L7 (3.81, 0.635) -> (16.51, 0.635)
  line L8 (16.51, 0.635) -> (16.51, -0.635)
  circle A0 centre (16.51, 0) radius 1.27
  line L9 (-3.1465, 21.592) -> (3.81, 21.592)
  line L10 (3.81, 21.592) -> (3.81, -19.2527)
  line L11 (3.81, -19.2527) -> (-3.1465, -19.2527)
  line L12 (-3.1465, -19.2527) -> (-3.1465, 21.592)
  point P0 (0, 0)
  point P1 (15.4101, 0.635)
  point P2 (15.4101, -0.635)
  dimension "d136" = 12.7
  dimension "d137" = 0.635
  dimension "d138" = 12.7
  dimension "d139" = 1.27
  dimension "d140" = 2.54
extrude "Extrusion3" cut sketch "Sketch4" along normal blind 25.4 and the other way blind 2.54
sketch "Sketch6" plane through (-2.54, 0, 0) normal (1, 0, 0) x (0, 0, -1)
  line L0 (12.4434, 3.81) -> (-12.4434, 3.81) projected
  line L1 (-23.003, -7.9462) -> (12.4434, -7.9462)
  line L2 (12.4434, -7.9462) -> (12.4434, 3.81)
  line L3 (12.4434, 3.81) -> (-23.003, 3.81)
  line L4 (-23.003, 3.81) -> (-23.003, -7.9462)
  point P0 (0, 0)
extrude "Extrusion4" cut sketch "Sketch6" against normal blind 25.4
properties part number "Basic seal circle handel"
